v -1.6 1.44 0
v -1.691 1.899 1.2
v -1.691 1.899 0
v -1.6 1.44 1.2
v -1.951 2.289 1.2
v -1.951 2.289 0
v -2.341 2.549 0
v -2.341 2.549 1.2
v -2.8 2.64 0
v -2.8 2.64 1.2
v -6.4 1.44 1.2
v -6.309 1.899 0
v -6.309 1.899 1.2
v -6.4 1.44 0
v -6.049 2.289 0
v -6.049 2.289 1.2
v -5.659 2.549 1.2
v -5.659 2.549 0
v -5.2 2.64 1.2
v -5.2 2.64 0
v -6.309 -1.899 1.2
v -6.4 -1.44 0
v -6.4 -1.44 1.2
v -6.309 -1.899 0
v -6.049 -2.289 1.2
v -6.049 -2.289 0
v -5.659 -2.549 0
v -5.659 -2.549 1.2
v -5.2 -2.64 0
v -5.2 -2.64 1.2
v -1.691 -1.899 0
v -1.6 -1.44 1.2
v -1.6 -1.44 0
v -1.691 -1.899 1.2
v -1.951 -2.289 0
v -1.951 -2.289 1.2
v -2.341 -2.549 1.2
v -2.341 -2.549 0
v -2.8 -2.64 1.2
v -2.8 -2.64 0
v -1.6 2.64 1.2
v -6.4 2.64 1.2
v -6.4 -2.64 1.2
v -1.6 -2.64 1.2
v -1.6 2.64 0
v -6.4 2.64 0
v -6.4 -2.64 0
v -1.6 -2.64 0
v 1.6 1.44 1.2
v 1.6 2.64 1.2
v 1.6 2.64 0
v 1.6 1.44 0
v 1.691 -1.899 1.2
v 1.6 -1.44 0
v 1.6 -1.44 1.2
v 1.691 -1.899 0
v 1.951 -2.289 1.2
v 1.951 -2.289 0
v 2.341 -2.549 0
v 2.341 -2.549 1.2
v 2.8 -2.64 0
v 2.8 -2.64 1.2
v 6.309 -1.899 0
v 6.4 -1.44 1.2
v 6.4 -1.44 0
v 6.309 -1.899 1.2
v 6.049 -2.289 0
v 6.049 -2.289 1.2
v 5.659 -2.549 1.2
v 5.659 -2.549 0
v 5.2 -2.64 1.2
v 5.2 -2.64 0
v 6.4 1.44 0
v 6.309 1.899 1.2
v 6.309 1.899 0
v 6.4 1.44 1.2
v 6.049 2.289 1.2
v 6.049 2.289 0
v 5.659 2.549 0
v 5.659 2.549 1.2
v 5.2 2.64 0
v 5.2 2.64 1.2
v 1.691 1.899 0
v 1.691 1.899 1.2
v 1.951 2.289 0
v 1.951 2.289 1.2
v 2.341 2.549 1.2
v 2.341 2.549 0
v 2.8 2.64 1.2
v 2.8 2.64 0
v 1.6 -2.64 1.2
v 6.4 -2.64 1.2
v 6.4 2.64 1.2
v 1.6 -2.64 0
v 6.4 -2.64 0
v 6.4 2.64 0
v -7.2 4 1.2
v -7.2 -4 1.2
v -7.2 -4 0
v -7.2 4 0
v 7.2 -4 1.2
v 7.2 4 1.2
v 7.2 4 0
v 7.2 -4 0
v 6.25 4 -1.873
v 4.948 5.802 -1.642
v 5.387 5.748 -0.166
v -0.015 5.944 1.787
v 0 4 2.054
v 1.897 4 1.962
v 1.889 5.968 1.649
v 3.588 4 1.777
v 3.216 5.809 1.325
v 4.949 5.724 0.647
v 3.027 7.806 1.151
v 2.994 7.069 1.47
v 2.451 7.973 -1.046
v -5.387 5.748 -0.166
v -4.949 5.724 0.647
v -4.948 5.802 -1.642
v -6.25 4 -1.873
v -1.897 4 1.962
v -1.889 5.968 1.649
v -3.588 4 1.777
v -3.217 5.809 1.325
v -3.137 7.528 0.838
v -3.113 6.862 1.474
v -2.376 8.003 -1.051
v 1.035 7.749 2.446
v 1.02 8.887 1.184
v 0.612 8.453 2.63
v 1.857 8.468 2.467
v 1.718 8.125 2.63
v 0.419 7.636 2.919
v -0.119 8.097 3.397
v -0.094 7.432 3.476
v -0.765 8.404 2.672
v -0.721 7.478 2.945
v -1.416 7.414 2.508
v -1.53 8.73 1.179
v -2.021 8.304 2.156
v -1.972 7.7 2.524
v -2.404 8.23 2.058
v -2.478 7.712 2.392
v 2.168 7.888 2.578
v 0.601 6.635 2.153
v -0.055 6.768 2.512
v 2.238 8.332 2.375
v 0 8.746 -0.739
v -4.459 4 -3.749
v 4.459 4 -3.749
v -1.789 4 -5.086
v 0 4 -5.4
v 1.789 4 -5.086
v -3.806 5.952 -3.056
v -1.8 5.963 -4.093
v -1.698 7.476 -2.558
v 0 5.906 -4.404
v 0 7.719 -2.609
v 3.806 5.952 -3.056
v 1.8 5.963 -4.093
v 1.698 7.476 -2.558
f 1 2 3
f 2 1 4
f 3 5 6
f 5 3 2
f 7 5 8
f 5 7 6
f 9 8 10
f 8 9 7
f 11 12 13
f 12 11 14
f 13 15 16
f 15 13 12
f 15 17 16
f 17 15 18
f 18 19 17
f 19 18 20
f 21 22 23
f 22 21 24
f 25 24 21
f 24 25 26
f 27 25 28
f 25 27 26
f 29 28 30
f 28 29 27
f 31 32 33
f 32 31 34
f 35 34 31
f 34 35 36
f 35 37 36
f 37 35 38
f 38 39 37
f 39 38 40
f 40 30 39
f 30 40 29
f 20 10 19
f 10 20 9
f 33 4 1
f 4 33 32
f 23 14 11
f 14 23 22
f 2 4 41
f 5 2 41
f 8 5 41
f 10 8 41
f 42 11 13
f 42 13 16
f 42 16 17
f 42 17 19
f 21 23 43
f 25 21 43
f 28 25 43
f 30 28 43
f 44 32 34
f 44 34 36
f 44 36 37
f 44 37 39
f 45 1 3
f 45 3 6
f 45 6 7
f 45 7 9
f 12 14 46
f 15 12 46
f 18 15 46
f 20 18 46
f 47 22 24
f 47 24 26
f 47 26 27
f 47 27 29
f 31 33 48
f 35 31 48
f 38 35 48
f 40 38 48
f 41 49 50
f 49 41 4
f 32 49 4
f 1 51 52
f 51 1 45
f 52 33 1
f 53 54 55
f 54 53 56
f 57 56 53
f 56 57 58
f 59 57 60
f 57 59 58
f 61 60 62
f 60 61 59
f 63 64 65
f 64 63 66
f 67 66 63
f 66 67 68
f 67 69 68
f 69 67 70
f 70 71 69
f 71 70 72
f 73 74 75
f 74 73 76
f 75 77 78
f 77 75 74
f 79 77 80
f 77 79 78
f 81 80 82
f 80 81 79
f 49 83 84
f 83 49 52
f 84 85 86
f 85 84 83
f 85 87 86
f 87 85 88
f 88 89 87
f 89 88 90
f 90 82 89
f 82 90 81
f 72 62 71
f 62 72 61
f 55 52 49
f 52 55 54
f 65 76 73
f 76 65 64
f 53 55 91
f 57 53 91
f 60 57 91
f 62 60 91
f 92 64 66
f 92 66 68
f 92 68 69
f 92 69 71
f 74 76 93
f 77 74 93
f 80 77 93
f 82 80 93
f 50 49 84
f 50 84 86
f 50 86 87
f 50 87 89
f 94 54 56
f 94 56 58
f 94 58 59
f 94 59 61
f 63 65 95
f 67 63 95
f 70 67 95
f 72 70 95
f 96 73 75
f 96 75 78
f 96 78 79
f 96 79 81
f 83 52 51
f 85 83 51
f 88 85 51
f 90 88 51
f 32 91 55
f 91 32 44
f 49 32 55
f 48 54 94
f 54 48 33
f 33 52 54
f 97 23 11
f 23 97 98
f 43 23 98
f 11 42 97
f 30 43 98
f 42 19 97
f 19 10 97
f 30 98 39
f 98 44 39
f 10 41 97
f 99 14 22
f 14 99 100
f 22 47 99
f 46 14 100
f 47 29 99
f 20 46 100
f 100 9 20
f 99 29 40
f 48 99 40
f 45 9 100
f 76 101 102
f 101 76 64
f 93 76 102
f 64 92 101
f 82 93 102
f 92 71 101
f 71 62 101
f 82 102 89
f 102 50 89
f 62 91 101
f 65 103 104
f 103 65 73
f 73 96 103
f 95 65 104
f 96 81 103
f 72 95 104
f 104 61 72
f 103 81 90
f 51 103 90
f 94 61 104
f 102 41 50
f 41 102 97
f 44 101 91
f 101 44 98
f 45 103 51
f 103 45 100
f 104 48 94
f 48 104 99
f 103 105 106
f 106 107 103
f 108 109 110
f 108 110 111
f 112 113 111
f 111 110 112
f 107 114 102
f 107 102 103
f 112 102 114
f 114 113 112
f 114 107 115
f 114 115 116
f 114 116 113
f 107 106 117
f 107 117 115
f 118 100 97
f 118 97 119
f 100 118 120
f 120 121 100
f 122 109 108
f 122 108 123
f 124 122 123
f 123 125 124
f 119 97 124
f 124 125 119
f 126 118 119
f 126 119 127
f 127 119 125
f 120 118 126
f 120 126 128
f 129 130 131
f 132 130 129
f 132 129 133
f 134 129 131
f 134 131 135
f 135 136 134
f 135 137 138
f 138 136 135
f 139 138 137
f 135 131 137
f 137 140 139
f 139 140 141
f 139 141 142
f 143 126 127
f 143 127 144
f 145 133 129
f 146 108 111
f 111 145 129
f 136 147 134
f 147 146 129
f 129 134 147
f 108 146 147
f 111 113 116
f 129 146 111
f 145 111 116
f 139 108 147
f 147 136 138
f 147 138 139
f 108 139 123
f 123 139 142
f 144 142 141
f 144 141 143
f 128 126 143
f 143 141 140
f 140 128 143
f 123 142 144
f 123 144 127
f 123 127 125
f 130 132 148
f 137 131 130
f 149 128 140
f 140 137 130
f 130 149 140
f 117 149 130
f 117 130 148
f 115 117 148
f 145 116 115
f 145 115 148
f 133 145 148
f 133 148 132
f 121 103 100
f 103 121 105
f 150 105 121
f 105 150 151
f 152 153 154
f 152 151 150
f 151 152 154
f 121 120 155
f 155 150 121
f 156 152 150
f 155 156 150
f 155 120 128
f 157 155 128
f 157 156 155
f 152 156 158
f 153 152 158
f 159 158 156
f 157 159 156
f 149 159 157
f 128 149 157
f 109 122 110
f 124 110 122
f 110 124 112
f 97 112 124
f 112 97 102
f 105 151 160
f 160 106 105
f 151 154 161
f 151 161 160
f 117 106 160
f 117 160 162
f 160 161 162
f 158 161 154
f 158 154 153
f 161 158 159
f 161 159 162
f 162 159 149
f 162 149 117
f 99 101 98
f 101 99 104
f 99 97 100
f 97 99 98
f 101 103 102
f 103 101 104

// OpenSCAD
// file: ../p/1-4edge.scad
use <../lib.scad>
function ldraw_lib__1_4edge() = [
// 0 Circle 0.25
// 0 Name: 1-4edge.dat
// 0 Author: James Jessiman
// 0 !LDRAW_ORG Primitive UPDATE 2017-01
// 0 !LICENSE Licensed under CC BY 2.0 and CC BY 4.0 : see CAreadme.txt
// 
// 0 BFC CERTIFY CCW
  [0,"BFC","CERTIFY"],
  [0,"BFC","CCW"],
// 
// 0 !HISTORY 2007-06-22 [PTadmin] Header formatted for Contributor Agreement
// 0 !HISTORY 2008-07-01 [PTadmin] Official Update 2008-01
// 0 !HISTORY 2017-01-15 [Steffen] BFCed
// 0 !HISTORY 2017-12-30 [PTadmin] Official Update 2017-01
// 
// 
// 2 24 1 0 0 0.9239 0 0.3827
  [2,24,1,0,0,0.9239,0,0.3827],
// 2 24 0.9239 0 0.3827 0.7071 0 0.7071
  [2,24,0.9239,0,0.3827,0.7071,0,0.7071],
// 2 24 0.7071 0 0.7071 0.3827 0 0.9239
  [2,24,0.7071,0,0.7071,0.3827,0,0.9239],
// 2 24 0.3827 0 0.9239 0 0 1
  [2,24,0.3827,0,0.9239,0,0,1],
];
module ldraw_lib__1_4edge(step=0, col=false, unit=2/5, alt=false, line=0.2, solid=!$preview)
    makepoly(ldraw_lib__1_4edge(), step=step, col=col, unit=unit, alt=alt, line=line, solid=solid);
ldraw_lib__1_4edge(line=0.2);
// file: ../p/1-4cyli.scad
use <../lib.scad>
function ldraw_lib__1_4cyli() = [
// 0 Cylinder 0.25
// 0 Name: 1-4cyli.dat
// 0 Author: James Jessiman
// 0 !LDRAW_ORG Primitive UPDATE 2012-01
// 0 !LICENSE Licensed under CC BY 2.0 and CC BY 4.0 : see CAreadme.txt
// 
// 0 BFC CERTIFY CCW
  [0,"BFC","CERTIFY"],
  [0,"BFC","CCW"],
// 
// 0 !HISTORY 2002-03-23 [sbliss] Added BFC statement.
// 0 !HISTORY 2002-04-25 [PTadmin] Official Update 2002-02
// 0 !HISTORY 2007-06-22 [PTadmin] Header formatted for Contributor Agreement
// 0 !HISTORY 2008-07-01 [PTadmin] Official Update 2008-01
// 0 !HISTORY 2012-02-16 [Philo] Changed to CCW
// 0 !HISTORY 2012-03-30 [PTadmin] Official Update 2012-01
// 
// 
// 4 16 1 1 0 0.9239 1 0.3827 0.9239 0 0.3827 1 0 0
  [4,16,1,1,0,0.9239,1,0.3827,0.9239,0,0.3827,1,0,0],
// 5 24 1 0 0 1 1 0 0.9239 0 0.3827 1 0 -1
  [5,24,1,0,0,1,1,0,0.9239,0,0.3827,1,0,-1],
// 4 16 0.9239 1 0.3827 0.7071 1 0.7071 0.7071 0 0.7071 0.9239 0 0.3827
  [4,16,0.9239,1,0.3827,0.7071,1,0.7071,0.7071,0,0.7071,0.9239,0,0.3827],
// 5 24 0.9239 0 0.3827 0.9239 1 0.3827 0.7071 0 0.7071 1 0 0
  [5,24,0.9239,0,0.3827,0.9239,1,0.3827,0.7071,0,0.7071,1,0,0],
// 4 16 0.7071 1 0.7071 0.3827 1 0.9239 0.3827 0 0.9239 0.7071 0 0.7071
  [4,16,0.7071,1,0.7071,0.3827,1,0.9239,0.3827,0,0.9239,0.7071,0,0.7071],
// 5 24 0.7071 0 0.7071 0.7071 1 0.7071 0.3827 0 0.9239 0.9239 0 0.3827
  [5,24,0.7071,0,0.7071,0.7071,1,0.7071,0.3827,0,0.9239,0.9239,0,0.3827],
// 4 16 0.3827 1 0.9239 0 1 1 0 0 1 0.3827 0 0.9239
  [4,16,0.3827,1,0.9239,0,1,1,0,0,1,0.3827,0,0.9239],
// 5 24 0.3827 0 0.9239 0.3827 1 0.9239 0 0 1 0.7071 0 0.7071
  [5,24,0.3827,0,0.9239,0.3827,1,0.9239,0,0,1,0.7071,0,0.7071],
// 5 24 0 0 1 0 1 1 0.3827 0 0.9239 -1 0 1
  [5,24,0,0,1,0,1,1,0.3827,0,0.9239,-1,0,1],
];
module ldraw_lib__1_4cyli(step=0, col=false, unit=2/5, alt=false, line=0.2, solid=!$preview)
    makepoly(ldraw_lib__1_4cyli(), step=step, col=col, unit=unit, alt=alt, line=line, solid=solid);
ldraw_lib__1_4cyli(line=0.2);
// file: ../p/rect2p.scad
use <../lib.scad>
function ldraw_lib__rect2p() = [
// 0 Rectangle with 2 Parallel Edges
// 0 Name: rect2p.dat
// 0 Author: Donald Sutter [technog]
// 0 !LDRAW_ORG Primitive UPDATE 2010-01
// 0 !LICENSE Licensed under CC BY 2.0 and CC BY 4.0 : see CAreadme.txt
// 
// 0 BFC CERTIFY CCW
  [0,"BFC","CERTIFY"],
  [0,"BFC","CCW"],
// 
// 0 !HISTORY 2003-08-01 [PTadmin] Official Update 2003-02
// 0 !HISTORY 2007-06-24 [PTadmin] Header formatted for Contributor Agreement
// 0 !HISTORY 2008-07-01 [PTadmin] Official Update 2008-01
// 0 !HISTORY 2010-01-17 [mikeheide] changed winding to CCW
// 0 !HISTORY 2010-04-05 [PTadmin] Official Update 2010-01
// 
// 
// 2 24 1 0 1 -1 0 1
  [2,24,1,0,1,-1,0,1],
// 2 24 -1 0 -1 1 0 -1
  [2,24,-1,0,-1,1,0,-1],
// 4 16 -1 0 1 -1 0 -1 1 0 -1 1 0 1
  [4,16,-1,0,1,-1,0,-1,1,0,-1,1,0,1],
// 0
];
module ldraw_lib__rect2p(step=0, col=false, unit=2/5, alt=false, line=0.2, solid=!$preview)
    makepoly(ldraw_lib__rect2p(), step=step, col=col, unit=unit, alt=alt, line=line, solid=solid);
ldraw_lib__rect2p(line=0.2);
// file: ../p/1-4ndis.scad
use <../lib.scad>
function ldraw_lib__1_4ndis() = [
// 0 Disc Negative 0.25
// 0 Name: 1-4ndis.dat
// 0 Author: James Jessiman
// 0 !LDRAW_ORG Primitive UPDATE 2012-01
// 0 !LICENSE Licensed under CC BY 2.0 and CC BY 4.0 : see CAreadme.txt
// 
// 0 BFC CERTIFY CCW
  [0,"BFC","CERTIFY"],
  [0,"BFC","CCW"],
// 
// 0 !HISTORY 2002-03-23 [sbliss] Added BFC Statement
// 0 !HISTORY 2002-04-25 [PTadmin] Official Update 2002-02
// 0 !HISTORY 2007-06-22 [PTadmin] Header formatted for Contributor Agreement
// 0 !HISTORY 2008-07-01 [PTadmin] Official Update 2008-01
// 0 !HISTORY 2012-02-16 [Philo] Changed to CCW
// 0 !HISTORY 2012-03-30 [PTadmin] Official Update 2012-01
// 
// 
// 3 16 0.9239 0 0.3827 1 0 0 1 0 1
  [3,16,0.9239,0,0.3827,1,0,0,1,0,1],
// 3 16 0.7071 0 0.7071 0.9239 0 0.3827 1 0 1
  [3,16,0.7071,0,0.7071,0.9239,0,0.3827,1,0,1],
// 3 16 0.3827 0 0.9239 0.7071 0 0.7071 1 0 1
  [3,16,0.3827,0,0.9239,0.7071,0,0.7071,1,0,1],
// 3 16 0 0 1 0.3827 0 0.9239 1 0 1
  [3,16,0,0,1,0.3827,0,0.9239,1,0,1],
];
module ldraw_lib__1_4ndis(step=0, col=false, unit=2/5, alt=false, line=0.2, solid=!$preview)
    makepoly(ldraw_lib__1_4ndis(), step=step, col=col, unit=unit, alt=alt, line=line, solid=solid);
ldraw_lib__1_4ndis(line=0.2);
// file: ../p/1-4cylo.scad
use <../lib.scad>
use <1-4cyli.scad>
use <1-4edge.scad>
function ldraw_lib__1_4cylo() = [
// 0 Cylinder Open 0.25
// 0 Name: 1-4cylo.dat
// 0 Author: Max Martin Richter [MMR1988]
// 0 !LDRAW_ORG Primitive UPDATE 2010-03
// 0 !LICENSE Licensed under CC BY 2.0 and CC BY 4.0 : see CAreadme.txt
// 
// 0 BFC CERTIFY CCW
  [0,"BFC","CERTIFY"],
  [0,"BFC","CCW"],
// 
// 0 !HISTORY 2010-12-31 [PTadmin] Official Update 2010-03
// 
// 
// 1 16 0 0 0 1 0 0 0 1 0 0 0 1 1-4edge.dat
  [1,16,0,0,0,1,0,0,0,1,0,0,0,1, ldraw_lib__1_4edge()],
// 1 16 0 1 0 1 0 0 0 1 0 0 0 1 1-4edge.dat
  [1,16,0,1,0,1,0,0,0,1,0,0,0,1, ldraw_lib__1_4edge()],
// 1 16 0 0 0 1 0 0 0 1 0 0 0 1 1-4cyli.dat
  [1,16,0,0,0,1,0,0,0,1,0,0,0,1, ldraw_lib__1_4cyli()],
];
module ldraw_lib__1_4cylo(step=0, col=false, unit=2/5, alt=false, line=0.2, solid=!$preview)
    makepoly(ldraw_lib__1_4cylo(), step=step, col=col, unit=unit, alt=alt, line=line, solid=solid);
ldraw_lib__1_4cylo(line=0.2);
// file: s/24779s03.scad
use <../../lib.scad>
use <../../p/1-4cylo.scad>
use <../../p/1-4ndis.scad>
use <../../p/rect2p.scad>
function ldraw_lib__s__24779s03() = [
// 0 ~Minifig Hipwear Antistud
// 0 Name: s\24779s03.dat
// 0 Author: Gerald Lasser [GeraldLasser]
// 0 !LDRAW_ORG Subpart UPDATE 2022-03
// 0 !LICENSE Licensed under CC BY 2.0 and CC BY 4.0 : see CAreadme.txt
// 
// 0 BFC CERTIFY CCW
  [0,"BFC","CERTIFY"],
  [0,"BFC","CCW"],
// 
// 0 !HISTORY 2022-05-07 [PTadmin] Official Update 2022-03
// 
// 
// 0 BFC INVERTNEXT
  [0,"BFC","INVERTNEXT"],
// 1 16 -7 -3 3.6 3 0 0 0 3 0 0 0 3 1-4cylo.dat
  [1,16,-7,-3,3.6,3,0,0,0,3,0,0,0,3, ldraw_lib__1_4cylo()],
// 0 BFC INVERTNEXT
  [0,"BFC","INVERTNEXT"],
// 1 16 -13 -3 3.6 -3 0 0 0 3 0 0 0 3 1-4cylo.dat
  [1,16,-13,-3,3.6,-3,0,0,0,3,0,0,0,3, ldraw_lib__1_4cylo()],
// 0 BFC INVERTNEXT
  [0,"BFC","INVERTNEXT"],
// 1 16 -13 -3 -3.6 -3 0 0 0 3 0 0 0 -3 1-4cylo.dat
  [1,16,-13,-3,-3.6,-3,0,0,0,3,0,0,0,-3, ldraw_lib__1_4cylo()],
// 0 BFC INVERTNEXT
  [0,"BFC","INVERTNEXT"],
// 1 16 -7 -3 -3.6 3 0 0 0 3 0 0 0 -3 1-4cylo.dat
  [1,16,-7,-3,-3.6,3,0,0,0,3,0,0,0,-3, ldraw_lib__1_4cylo()],
// 1 16 -10 -1.5 -6.6 3 0 0 0 0 -1.5 0 -1 0 rect2p.dat
  [1,16,-10,-1.5,-6.6,3,0,0,0,0,-1.5,0,-1,0, ldraw_lib__rect2p()],
// 1 16 -10 -1.5 6.6 3 0 0 0 0 -1.5 0 1 0 rect2p.dat
  [1,16,-10,-1.5,6.6,3,0,0,0,0,-1.5,0,1,0, ldraw_lib__rect2p()],
// 1 16 -4 -1.5 0 0 1 0 0 0 -1.5 -3.6 0 0 rect2p.dat
  [1,16,-4,-1.5,0,0,1,0,0,0,-1.5,-3.6,0,0, ldraw_lib__rect2p()],
// 1 16 -16 -1.5 0 0 -1 0 0 0 -1.5 -3.6 0 0 rect2p.dat
  [1,16,-16,-1.5,0,0,-1,0,0,0,-1.5,-3.6,0,0, ldraw_lib__rect2p()],
// 1 16 -7 -3 3.6 3 0 0 0 1 0 0 0 3 1-4ndis.dat
  [1,16,-7,-3,3.6,3,0,0,0,1,0,0,0,3, ldraw_lib__1_4ndis()],
// 1 16 -13 -3 3.6 -3 0 0 0 1 0 0 0 3 1-4ndis.dat
  [1,16,-13,-3,3.6,-3,0,0,0,1,0,0,0,3, ldraw_lib__1_4ndis()],
// 1 16 -13 -3 -3.6 -3 0 0 0 1 0 0 0 -3 1-4ndis.dat
  [1,16,-13,-3,-3.6,-3,0,0,0,1,0,0,0,-3, ldraw_lib__1_4ndis()],
// 1 16 -7 -3 -3.6 3 0 0 0 1 0 0 0 -3 1-4ndis.dat
  [1,16,-7,-3,-3.6,3,0,0,0,1,0,0,0,-3, ldraw_lib__1_4ndis()],
// 1 16 -7 0 3.6 3 0 0 0 -1 0 0 0 3 1-4ndis.dat
  [1,16,-7,0,3.6,3,0,0,0,-1,0,0,0,3, ldraw_lib__1_4ndis()],
// 1 16 -13 0 3.6 -3 0 0 0 -1 0 0 0 3 1-4ndis.dat
  [1,16,-13,0,3.6,-3,0,0,0,-1,0,0,0,3, ldraw_lib__1_4ndis()],
// 1 16 -13 0 -3.6 -3 0 0 0 -1 0 0 0 -3 1-4ndis.dat
  [1,16,-13,0,-3.6,-3,0,0,0,-1,0,0,0,-3, ldraw_lib__1_4ndis()],
// 1 16 -7 0 -3.6 3 0 0 0 -1 0 0 0 -3 1-4ndis.dat
  [1,16,-7,0,-3.6,3,0,0,0,-1,0,0,0,-3, ldraw_lib__1_4ndis()],
// 
// 4 16 4 -3 6.6 -4 -3 6.6 -4 -3 3.6 4 -3 3.6
  [4,16,4,-3,6.6,-4,-3,6.6,-4,-3,3.6,4,-3,3.6],
// 3 16 -4 -3 -3.6 4 -3 3.6 -4 -3 3.6
  [3,16,-4,-3,-3.6,4,-3,3.6,-4,-3,3.6],
// 4 16 -4 0 3.6 -4 0 6.6 4 0 6.6 4 0 3.6
  [4,16,-4,0,3.6,-4,0,6.6,4,0,6.6,4,0,3.6],
// 3 16 4 0 3.6 -4 0 -3.6 -4 0 3.6
  [3,16,4,0,3.6,-4,0,-3.6,-4,0,3.6],
];
module ldraw_lib__s__24779s03(step=0, col=false, unit=2/5, alt=false, line=0.2, solid=!$preview)
    makepoly(ldraw_lib__s__24779s03(), step=step, col=col, unit=unit, alt=alt, line=line, solid=solid);
ldraw_lib__s__24779s03(line=0.2);
// file: s/24779s02.scad
use <../../lib.scad>
use <24779s03.scad>
function ldraw_lib__s__24779s02() = [
// 0 ~Minifig Hipwear Antistuds Common Geometry without Sides
// 0 Name: s\24779s02.dat
// 0 Author: Gerald Lasser [GeraldLasser]
// 0 !LDRAW_ORG Subpart UPDATE 2022-04
// 0 !LICENSE Licensed under CC BY 2.0 and CC BY 4.0 : see CAreadme.txt
// 
// 0 BFC CERTIFY CCW
  [0,"BFC","CERTIFY"],
  [0,"BFC","CCW"],
// 
// 0 !HISTORY 2022-03-10 [MagFors] corrected hip width
// 0 !HISTORY 2022-07-18 [PTadmin] Official Update 2022-04
// 
// 
// 1 16 0 0 0 1 0 0 0 1 0 0 0 1 s\24779s03.dat
  [1,16,0,0,0,1,0,0,0,1,0,0,0,1, ldraw_lib__s__24779s03()],
// 1 16 0 0 0 -1 0 0 0 1 0 0 0 -1 s\24779s03.dat
  [1,16,0,0,0,-1,0,0,0,1,0,0,0,-1, ldraw_lib__s__24779s03()],
// 
// 4 16 -18 -3 10 -18 -3 -10 -16 -3 -3.6 -16 -3 3.6
  [4,16,-18,-3,10,-18,-3,-10,-16,-3,-3.6,-16,-3,3.6],
// 3 16 -16 -3 -6.6 -16 -3 -3.6 -18 -3 -10
  [3,16,-16,-3,-6.6,-16,-3,-3.6,-18,-3,-10],
// 3 16 -16 -3 3.6 -16 -3 6.6 -18 -3 10
  [3,16,-16,-3,3.6,-16,-3,6.6,-18,-3,10],
// 3 16 -13 -3 -6.6 -16 -3 -6.6 -18 -3 -10
  [3,16,-13,-3,-6.6,-16,-3,-6.6,-18,-3,-10],
// 3 16 -16 -3 6.6 -13 -3 6.6 -18 -3 10
  [3,16,-16,-3,6.6,-13,-3,6.6,-18,-3,10],
// 3 16 -13 -3 6.6 -7 -3 6.6 -18 -3 10
  [3,16,-13,-3,6.6,-7,-3,6.6,-18,-3,10],
// 3 16 -13 -3 -6.6 -18 -3 -10 -7 -3 -6.6
  [3,16,-13,-3,-6.6,-18,-3,-10,-7,-3,-6.6],
// 3 16 -18 -3 -10 -4 -3 -6.6 -7 -3 -6.6
  [3,16,-18,-3,-10,-4,-3,-6.6,-7,-3,-6.6],
// 3 16 -7 -3 6.6 -4 -3 6.6 -18 -3 10
  [3,16,-7,-3,6.6,-4,-3,6.6,-18,-3,10],
// 4 16 -16 0 -3.6 -18 0 -10 -18 0 10 -16 0 3.6
  [4,16,-16,0,-3.6,-18,0,-10,-18,0,10,-16,0,3.6],
// 3 16 -16 0 -3.6 -16 0 -6.6 -18 0 -10
  [3,16,-16,0,-3.6,-16,0,-6.6,-18,0,-10],
// 3 16 -16 0 6.6 -16 0 3.6 -18 0 10
  [3,16,-16,0,6.6,-16,0,3.6,-18,0,10],
// 3 16 -16 0 -6.6 -13 0 -6.6 -18 0 -10
  [3,16,-16,0,-6.6,-13,0,-6.6,-18,0,-10],
// 3 16 -13 0 6.6 -16 0 6.6 -18 0 10
  [3,16,-13,0,6.6,-16,0,6.6,-18,0,10],
// 3 16 -18 0 10 -7 0 6.6 -13 0 6.6
  [3,16,-18,0,10,-7,0,6.6,-13,0,6.6],
// 3 16 -18 0 -10 -13 0 -6.6 -7 0 -6.6
  [3,16,-18,0,-10,-13,0,-6.6,-7,0,-6.6],
// 3 16 -4 0 -6.6 -18 0 -10 -7 0 -6.6
  [3,16,-4,0,-6.6,-18,0,-10,-7,0,-6.6],
// 3 16 -4 0 6.6 -7 0 6.6 -18 0 10
  [3,16,-4,0,6.6,-7,0,6.6,-18,0,10],
// 
// 4 16 18 -3 -10 18 -3 10 16 -3 3.6 16 -3 -3.6
  [4,16,18,-3,-10,18,-3,10,16,-3,3.6,16,-3,-3.6],
// 3 16 16 -3 6.6 16 -3 3.6 18 -3 10
  [3,16,16,-3,6.6,16,-3,3.6,18,-3,10],
// 3 16 16 -3 -3.6 16 -3 -6.6 18 -3 -10
  [3,16,16,-3,-3.6,16,-3,-6.6,18,-3,-10],
// 3 16 13 -3 6.6 16 -3 6.6 18 -3 10
  [3,16,13,-3,6.6,16,-3,6.6,18,-3,10],
// 3 16 16 -3 -6.6 13 -3 -6.6 18 -3 -10
  [3,16,16,-3,-6.6,13,-3,-6.6,18,-3,-10],
// 3 16 13 -3 -6.6 7 -3 -6.6 18 -3 -10
  [3,16,13,-3,-6.6,7,-3,-6.6,18,-3,-10],
// 3 16 13 -3 6.6 18 -3 10 7 -3 6.6
  [3,16,13,-3,6.6,18,-3,10,7,-3,6.6],
// 3 16 18 -3 10 4 -3 6.6 7 -3 6.6
  [3,16,18,-3,10,4,-3,6.6,7,-3,6.6],
// 3 16 7 -3 -6.6 4 -3 -6.6 18 -3 -10
  [3,16,7,-3,-6.6,4,-3,-6.6,18,-3,-10],
// 4 16 16 0 3.6 18 0 10 18 0 -10 16 0 -3.6
  [4,16,16,0,3.6,18,0,10,18,0,-10,16,0,-3.6],
// 3 16 16 0 3.6 16 0 6.6 18 0 10
  [3,16,16,0,3.6,16,0,6.6,18,0,10],
// 3 16 16 0 -6.6 16 0 -3.6 18 0 -10
  [3,16,16,0,-6.6,16,0,-3.6,18,0,-10],
// 3 16 16 0 6.6 13 0 6.6 18 0 10
  [3,16,16,0,6.6,13,0,6.6,18,0,10],
// 3 16 13 0 -6.6 16 0 -6.6 18 0 -10
  [3,16,13,0,-6.6,16,0,-6.6,18,0,-10],
// 3 16 18 0 -10 7 0 -6.6 13 0 -6.6
  [3,16,18,0,-10,7,0,-6.6,13,0,-6.6],
// 3 16 18 0 10 13 0 6.6 7 0 6.6
  [3,16,18,0,10,13,0,6.6,7,0,6.6],
// 3 16 4 0 6.6 18 0 10 7 0 6.6
  [3,16,4,0,6.6,18,0,10,7,0,6.6],
// 3 16 4 0 -6.6 7 0 -6.6 18 0 -10
  [3,16,4,0,-6.6,7,0,-6.6,18,0,-10],
// 
// 4 16 4 -3 6.6 18 -3 10 -18 -3 10 -4 -3 6.6
  [4,16,4,-3,6.6,18,-3,10,-18,-3,10,-4,-3,6.6],
// 4 16 18 -3 -10 4 -3 -6.6 -4 -3 -6.6 -18 -3 -10
  [4,16,18,-3,-10,4,-3,-6.6,-4,-3,-6.6,-18,-3,-10],
// 4 16 -18 0 10 18 0 10 4 0 6.6 -4 0 6.6
  [4,16,-18,0,10,18,0,10,4,0,6.6,-4,0,6.6],
// 4 16 -4 0 -6.6 4 0 -6.6 18 0 -10 -18 0 -10
  [4,16,-4,0,-6.6,4,0,-6.6,18,0,-10,-18,0,-10],
];
module ldraw_lib__s__24779s02(step=0, col=false, unit=2/5, alt=false, line=0.2, solid=!$preview)
    makepoly(ldraw_lib__s__24779s02(), step=step, col=col, unit=unit, alt=alt, line=line, solid=solid);
ldraw_lib__s__24779s02(line=0.2);
// file: ../p/box3u2p.scad
use <../lib.scad>
function ldraw_lib__box3u2p() = [
// 0 Box with 3 Faces without 2 Parallel Edges
// 0 Name: box3u2p.dat
// 0 Author: Niels Karsdorp [nielsk]
// 0 !LDRAW_ORG Primitive UPDATE 2012-01
// 0 !LICENSE Licensed under CC BY 2.0 and CC BY 4.0 : see CAreadme.txt
// 
// 0 BFC CERTIFY CCW
  [0,"BFC","CERTIFY"],
  [0,"BFC","CCW"],
// 
// 0 !HISTORY 2003-03-12 [PTadmin] Official Update 2003-01
// 0 !HISTORY 2007-06-24 [PTadmin] Header formatted for Contributor Agreement
// 0 !HISTORY 2008-07-01 [PTadmin] Official Update 2008-01
// 0 !HISTORY 2012-02-16 [Philo] Changed to CCW
// 0 !HISTORY 2012-03-30 [PTadmin] Official Update 2012-01
// 
// 
// 2 24 1 1 1 -1 1 1
  [2,24,1,1,1,-1,1,1],
// 2 24 -1 1 -1 1 1 -1
  [2,24,-1,1,-1,1,1,-1],
// 2 24 1 0 1 -1 0 1
  [2,24,1,0,1,-1,0,1],
// 2 24 -1 0 -1 1 0 -1
  [2,24,-1,0,-1,1,0,-1],
// 2 24 1 1 1 1 1 -1
  [2,24,1,1,1,1,1,-1],
// 2 24 -1 1 1 -1 1 -1
  [2,24,-1,1,1,-1,1,-1],
// 2 24 1 1 1 1 0 1
  [2,24,1,1,1,1,0,1],
// 2 24 1 1 -1 1 0 -1
  [2,24,1,1,-1,1,0,-1],
// 2 24 -1 1 1 -1 0 1
  [2,24,-1,1,1,-1,0,1],
// 2 24 -1 1 -1 -1 0 -1
  [2,24,-1,1,-1,-1,0,-1],
// 4 16 -1 1 -1 -1 1 1 1 1 1 1 1 -1
  [4,16,-1,1,-1,-1,1,1,1,1,1,1,1,-1],
// 4 16 -1 1 1 -1 0 1 1 0 1 1 1 1
  [4,16,-1,1,1,-1,0,1,1,0,1,1,1,1],
// 4 16 1 1 -1 1 0 -1 -1 0 -1 -1 1 -1
  [4,16,1,1,-1,1,0,-1,-1,0,-1,-1,1,-1],
];
module ldraw_lib__box3u2p(step=0, col=false, unit=2/5, alt=false, line=0.2, solid=!$preview)
    makepoly(ldraw_lib__box3u2p(), step=step, col=col, unit=unit, alt=alt, line=line, solid=solid);
ldraw_lib__box3u2p(line=0.2);
// main file
use <../lib.scad>
use <../p/box3u2p.scad>
use <s/24779s01.scad>
function ldraw_lib__24779() = [
// 0 Minifig Tail Duck
// 0 Name: 24779.dat
// 0 Author: Gerald Lasser [GeraldLasser]
// 0 !LDRAW_ORG Part UPDATE 2022-04
// 0 !LICENSE Licensed under CC BY 2.0 and CC BY 4.0 : see CAreadme.txt
// 
// 0 BFC CERTIFY CCW
  [0,"BFC","CERTIFY"],
  [0,"BFC","CCW"],
// 
// 0 !CATEGORY Minifig Hipwear
// 0 !KEYWORDS Disney
// 
// 0 !HISTORY 2013-08-14 {LEGO Digital Designer} Original part shape
// 0 !HISTORY 2019-08-15 [GeraldLasser] File preparation for LDraw Parts Tracker
// 0 !HISTORY 2022-03-10 [MagFors] corrected hip width
// 0 !HISTORY 2022-07-18 [PTadmin] Official Update 2022-04
// 
// 
// 1 16 0 0 0 1 0 0 0 1 0 0 0 1 s\24779s01.dat
  [1,16,0,0,0,1,0,0,0,1,0,0,0,1, ldraw_lib__s__24779s01()],
// 1 16 0 -1.5 10 0 0 -18 1.5 0 0 0 -20 0 box3u2p.dat
  [1,16,0,-1.5,10,0,0,-18,1.5,0,0,0,-20,0, ldraw_lib__box3u2p()],
];
module ldraw_lib__24779(step=0, col=false, unit=2/5, alt=false, line=0.2, solid=!$preview)
    makepoly(ldraw_lib__24779(), step=step, col=col, unit=unit, alt=alt, line=line, solid=solid);
ldraw_lib__24779(line=0.2);
